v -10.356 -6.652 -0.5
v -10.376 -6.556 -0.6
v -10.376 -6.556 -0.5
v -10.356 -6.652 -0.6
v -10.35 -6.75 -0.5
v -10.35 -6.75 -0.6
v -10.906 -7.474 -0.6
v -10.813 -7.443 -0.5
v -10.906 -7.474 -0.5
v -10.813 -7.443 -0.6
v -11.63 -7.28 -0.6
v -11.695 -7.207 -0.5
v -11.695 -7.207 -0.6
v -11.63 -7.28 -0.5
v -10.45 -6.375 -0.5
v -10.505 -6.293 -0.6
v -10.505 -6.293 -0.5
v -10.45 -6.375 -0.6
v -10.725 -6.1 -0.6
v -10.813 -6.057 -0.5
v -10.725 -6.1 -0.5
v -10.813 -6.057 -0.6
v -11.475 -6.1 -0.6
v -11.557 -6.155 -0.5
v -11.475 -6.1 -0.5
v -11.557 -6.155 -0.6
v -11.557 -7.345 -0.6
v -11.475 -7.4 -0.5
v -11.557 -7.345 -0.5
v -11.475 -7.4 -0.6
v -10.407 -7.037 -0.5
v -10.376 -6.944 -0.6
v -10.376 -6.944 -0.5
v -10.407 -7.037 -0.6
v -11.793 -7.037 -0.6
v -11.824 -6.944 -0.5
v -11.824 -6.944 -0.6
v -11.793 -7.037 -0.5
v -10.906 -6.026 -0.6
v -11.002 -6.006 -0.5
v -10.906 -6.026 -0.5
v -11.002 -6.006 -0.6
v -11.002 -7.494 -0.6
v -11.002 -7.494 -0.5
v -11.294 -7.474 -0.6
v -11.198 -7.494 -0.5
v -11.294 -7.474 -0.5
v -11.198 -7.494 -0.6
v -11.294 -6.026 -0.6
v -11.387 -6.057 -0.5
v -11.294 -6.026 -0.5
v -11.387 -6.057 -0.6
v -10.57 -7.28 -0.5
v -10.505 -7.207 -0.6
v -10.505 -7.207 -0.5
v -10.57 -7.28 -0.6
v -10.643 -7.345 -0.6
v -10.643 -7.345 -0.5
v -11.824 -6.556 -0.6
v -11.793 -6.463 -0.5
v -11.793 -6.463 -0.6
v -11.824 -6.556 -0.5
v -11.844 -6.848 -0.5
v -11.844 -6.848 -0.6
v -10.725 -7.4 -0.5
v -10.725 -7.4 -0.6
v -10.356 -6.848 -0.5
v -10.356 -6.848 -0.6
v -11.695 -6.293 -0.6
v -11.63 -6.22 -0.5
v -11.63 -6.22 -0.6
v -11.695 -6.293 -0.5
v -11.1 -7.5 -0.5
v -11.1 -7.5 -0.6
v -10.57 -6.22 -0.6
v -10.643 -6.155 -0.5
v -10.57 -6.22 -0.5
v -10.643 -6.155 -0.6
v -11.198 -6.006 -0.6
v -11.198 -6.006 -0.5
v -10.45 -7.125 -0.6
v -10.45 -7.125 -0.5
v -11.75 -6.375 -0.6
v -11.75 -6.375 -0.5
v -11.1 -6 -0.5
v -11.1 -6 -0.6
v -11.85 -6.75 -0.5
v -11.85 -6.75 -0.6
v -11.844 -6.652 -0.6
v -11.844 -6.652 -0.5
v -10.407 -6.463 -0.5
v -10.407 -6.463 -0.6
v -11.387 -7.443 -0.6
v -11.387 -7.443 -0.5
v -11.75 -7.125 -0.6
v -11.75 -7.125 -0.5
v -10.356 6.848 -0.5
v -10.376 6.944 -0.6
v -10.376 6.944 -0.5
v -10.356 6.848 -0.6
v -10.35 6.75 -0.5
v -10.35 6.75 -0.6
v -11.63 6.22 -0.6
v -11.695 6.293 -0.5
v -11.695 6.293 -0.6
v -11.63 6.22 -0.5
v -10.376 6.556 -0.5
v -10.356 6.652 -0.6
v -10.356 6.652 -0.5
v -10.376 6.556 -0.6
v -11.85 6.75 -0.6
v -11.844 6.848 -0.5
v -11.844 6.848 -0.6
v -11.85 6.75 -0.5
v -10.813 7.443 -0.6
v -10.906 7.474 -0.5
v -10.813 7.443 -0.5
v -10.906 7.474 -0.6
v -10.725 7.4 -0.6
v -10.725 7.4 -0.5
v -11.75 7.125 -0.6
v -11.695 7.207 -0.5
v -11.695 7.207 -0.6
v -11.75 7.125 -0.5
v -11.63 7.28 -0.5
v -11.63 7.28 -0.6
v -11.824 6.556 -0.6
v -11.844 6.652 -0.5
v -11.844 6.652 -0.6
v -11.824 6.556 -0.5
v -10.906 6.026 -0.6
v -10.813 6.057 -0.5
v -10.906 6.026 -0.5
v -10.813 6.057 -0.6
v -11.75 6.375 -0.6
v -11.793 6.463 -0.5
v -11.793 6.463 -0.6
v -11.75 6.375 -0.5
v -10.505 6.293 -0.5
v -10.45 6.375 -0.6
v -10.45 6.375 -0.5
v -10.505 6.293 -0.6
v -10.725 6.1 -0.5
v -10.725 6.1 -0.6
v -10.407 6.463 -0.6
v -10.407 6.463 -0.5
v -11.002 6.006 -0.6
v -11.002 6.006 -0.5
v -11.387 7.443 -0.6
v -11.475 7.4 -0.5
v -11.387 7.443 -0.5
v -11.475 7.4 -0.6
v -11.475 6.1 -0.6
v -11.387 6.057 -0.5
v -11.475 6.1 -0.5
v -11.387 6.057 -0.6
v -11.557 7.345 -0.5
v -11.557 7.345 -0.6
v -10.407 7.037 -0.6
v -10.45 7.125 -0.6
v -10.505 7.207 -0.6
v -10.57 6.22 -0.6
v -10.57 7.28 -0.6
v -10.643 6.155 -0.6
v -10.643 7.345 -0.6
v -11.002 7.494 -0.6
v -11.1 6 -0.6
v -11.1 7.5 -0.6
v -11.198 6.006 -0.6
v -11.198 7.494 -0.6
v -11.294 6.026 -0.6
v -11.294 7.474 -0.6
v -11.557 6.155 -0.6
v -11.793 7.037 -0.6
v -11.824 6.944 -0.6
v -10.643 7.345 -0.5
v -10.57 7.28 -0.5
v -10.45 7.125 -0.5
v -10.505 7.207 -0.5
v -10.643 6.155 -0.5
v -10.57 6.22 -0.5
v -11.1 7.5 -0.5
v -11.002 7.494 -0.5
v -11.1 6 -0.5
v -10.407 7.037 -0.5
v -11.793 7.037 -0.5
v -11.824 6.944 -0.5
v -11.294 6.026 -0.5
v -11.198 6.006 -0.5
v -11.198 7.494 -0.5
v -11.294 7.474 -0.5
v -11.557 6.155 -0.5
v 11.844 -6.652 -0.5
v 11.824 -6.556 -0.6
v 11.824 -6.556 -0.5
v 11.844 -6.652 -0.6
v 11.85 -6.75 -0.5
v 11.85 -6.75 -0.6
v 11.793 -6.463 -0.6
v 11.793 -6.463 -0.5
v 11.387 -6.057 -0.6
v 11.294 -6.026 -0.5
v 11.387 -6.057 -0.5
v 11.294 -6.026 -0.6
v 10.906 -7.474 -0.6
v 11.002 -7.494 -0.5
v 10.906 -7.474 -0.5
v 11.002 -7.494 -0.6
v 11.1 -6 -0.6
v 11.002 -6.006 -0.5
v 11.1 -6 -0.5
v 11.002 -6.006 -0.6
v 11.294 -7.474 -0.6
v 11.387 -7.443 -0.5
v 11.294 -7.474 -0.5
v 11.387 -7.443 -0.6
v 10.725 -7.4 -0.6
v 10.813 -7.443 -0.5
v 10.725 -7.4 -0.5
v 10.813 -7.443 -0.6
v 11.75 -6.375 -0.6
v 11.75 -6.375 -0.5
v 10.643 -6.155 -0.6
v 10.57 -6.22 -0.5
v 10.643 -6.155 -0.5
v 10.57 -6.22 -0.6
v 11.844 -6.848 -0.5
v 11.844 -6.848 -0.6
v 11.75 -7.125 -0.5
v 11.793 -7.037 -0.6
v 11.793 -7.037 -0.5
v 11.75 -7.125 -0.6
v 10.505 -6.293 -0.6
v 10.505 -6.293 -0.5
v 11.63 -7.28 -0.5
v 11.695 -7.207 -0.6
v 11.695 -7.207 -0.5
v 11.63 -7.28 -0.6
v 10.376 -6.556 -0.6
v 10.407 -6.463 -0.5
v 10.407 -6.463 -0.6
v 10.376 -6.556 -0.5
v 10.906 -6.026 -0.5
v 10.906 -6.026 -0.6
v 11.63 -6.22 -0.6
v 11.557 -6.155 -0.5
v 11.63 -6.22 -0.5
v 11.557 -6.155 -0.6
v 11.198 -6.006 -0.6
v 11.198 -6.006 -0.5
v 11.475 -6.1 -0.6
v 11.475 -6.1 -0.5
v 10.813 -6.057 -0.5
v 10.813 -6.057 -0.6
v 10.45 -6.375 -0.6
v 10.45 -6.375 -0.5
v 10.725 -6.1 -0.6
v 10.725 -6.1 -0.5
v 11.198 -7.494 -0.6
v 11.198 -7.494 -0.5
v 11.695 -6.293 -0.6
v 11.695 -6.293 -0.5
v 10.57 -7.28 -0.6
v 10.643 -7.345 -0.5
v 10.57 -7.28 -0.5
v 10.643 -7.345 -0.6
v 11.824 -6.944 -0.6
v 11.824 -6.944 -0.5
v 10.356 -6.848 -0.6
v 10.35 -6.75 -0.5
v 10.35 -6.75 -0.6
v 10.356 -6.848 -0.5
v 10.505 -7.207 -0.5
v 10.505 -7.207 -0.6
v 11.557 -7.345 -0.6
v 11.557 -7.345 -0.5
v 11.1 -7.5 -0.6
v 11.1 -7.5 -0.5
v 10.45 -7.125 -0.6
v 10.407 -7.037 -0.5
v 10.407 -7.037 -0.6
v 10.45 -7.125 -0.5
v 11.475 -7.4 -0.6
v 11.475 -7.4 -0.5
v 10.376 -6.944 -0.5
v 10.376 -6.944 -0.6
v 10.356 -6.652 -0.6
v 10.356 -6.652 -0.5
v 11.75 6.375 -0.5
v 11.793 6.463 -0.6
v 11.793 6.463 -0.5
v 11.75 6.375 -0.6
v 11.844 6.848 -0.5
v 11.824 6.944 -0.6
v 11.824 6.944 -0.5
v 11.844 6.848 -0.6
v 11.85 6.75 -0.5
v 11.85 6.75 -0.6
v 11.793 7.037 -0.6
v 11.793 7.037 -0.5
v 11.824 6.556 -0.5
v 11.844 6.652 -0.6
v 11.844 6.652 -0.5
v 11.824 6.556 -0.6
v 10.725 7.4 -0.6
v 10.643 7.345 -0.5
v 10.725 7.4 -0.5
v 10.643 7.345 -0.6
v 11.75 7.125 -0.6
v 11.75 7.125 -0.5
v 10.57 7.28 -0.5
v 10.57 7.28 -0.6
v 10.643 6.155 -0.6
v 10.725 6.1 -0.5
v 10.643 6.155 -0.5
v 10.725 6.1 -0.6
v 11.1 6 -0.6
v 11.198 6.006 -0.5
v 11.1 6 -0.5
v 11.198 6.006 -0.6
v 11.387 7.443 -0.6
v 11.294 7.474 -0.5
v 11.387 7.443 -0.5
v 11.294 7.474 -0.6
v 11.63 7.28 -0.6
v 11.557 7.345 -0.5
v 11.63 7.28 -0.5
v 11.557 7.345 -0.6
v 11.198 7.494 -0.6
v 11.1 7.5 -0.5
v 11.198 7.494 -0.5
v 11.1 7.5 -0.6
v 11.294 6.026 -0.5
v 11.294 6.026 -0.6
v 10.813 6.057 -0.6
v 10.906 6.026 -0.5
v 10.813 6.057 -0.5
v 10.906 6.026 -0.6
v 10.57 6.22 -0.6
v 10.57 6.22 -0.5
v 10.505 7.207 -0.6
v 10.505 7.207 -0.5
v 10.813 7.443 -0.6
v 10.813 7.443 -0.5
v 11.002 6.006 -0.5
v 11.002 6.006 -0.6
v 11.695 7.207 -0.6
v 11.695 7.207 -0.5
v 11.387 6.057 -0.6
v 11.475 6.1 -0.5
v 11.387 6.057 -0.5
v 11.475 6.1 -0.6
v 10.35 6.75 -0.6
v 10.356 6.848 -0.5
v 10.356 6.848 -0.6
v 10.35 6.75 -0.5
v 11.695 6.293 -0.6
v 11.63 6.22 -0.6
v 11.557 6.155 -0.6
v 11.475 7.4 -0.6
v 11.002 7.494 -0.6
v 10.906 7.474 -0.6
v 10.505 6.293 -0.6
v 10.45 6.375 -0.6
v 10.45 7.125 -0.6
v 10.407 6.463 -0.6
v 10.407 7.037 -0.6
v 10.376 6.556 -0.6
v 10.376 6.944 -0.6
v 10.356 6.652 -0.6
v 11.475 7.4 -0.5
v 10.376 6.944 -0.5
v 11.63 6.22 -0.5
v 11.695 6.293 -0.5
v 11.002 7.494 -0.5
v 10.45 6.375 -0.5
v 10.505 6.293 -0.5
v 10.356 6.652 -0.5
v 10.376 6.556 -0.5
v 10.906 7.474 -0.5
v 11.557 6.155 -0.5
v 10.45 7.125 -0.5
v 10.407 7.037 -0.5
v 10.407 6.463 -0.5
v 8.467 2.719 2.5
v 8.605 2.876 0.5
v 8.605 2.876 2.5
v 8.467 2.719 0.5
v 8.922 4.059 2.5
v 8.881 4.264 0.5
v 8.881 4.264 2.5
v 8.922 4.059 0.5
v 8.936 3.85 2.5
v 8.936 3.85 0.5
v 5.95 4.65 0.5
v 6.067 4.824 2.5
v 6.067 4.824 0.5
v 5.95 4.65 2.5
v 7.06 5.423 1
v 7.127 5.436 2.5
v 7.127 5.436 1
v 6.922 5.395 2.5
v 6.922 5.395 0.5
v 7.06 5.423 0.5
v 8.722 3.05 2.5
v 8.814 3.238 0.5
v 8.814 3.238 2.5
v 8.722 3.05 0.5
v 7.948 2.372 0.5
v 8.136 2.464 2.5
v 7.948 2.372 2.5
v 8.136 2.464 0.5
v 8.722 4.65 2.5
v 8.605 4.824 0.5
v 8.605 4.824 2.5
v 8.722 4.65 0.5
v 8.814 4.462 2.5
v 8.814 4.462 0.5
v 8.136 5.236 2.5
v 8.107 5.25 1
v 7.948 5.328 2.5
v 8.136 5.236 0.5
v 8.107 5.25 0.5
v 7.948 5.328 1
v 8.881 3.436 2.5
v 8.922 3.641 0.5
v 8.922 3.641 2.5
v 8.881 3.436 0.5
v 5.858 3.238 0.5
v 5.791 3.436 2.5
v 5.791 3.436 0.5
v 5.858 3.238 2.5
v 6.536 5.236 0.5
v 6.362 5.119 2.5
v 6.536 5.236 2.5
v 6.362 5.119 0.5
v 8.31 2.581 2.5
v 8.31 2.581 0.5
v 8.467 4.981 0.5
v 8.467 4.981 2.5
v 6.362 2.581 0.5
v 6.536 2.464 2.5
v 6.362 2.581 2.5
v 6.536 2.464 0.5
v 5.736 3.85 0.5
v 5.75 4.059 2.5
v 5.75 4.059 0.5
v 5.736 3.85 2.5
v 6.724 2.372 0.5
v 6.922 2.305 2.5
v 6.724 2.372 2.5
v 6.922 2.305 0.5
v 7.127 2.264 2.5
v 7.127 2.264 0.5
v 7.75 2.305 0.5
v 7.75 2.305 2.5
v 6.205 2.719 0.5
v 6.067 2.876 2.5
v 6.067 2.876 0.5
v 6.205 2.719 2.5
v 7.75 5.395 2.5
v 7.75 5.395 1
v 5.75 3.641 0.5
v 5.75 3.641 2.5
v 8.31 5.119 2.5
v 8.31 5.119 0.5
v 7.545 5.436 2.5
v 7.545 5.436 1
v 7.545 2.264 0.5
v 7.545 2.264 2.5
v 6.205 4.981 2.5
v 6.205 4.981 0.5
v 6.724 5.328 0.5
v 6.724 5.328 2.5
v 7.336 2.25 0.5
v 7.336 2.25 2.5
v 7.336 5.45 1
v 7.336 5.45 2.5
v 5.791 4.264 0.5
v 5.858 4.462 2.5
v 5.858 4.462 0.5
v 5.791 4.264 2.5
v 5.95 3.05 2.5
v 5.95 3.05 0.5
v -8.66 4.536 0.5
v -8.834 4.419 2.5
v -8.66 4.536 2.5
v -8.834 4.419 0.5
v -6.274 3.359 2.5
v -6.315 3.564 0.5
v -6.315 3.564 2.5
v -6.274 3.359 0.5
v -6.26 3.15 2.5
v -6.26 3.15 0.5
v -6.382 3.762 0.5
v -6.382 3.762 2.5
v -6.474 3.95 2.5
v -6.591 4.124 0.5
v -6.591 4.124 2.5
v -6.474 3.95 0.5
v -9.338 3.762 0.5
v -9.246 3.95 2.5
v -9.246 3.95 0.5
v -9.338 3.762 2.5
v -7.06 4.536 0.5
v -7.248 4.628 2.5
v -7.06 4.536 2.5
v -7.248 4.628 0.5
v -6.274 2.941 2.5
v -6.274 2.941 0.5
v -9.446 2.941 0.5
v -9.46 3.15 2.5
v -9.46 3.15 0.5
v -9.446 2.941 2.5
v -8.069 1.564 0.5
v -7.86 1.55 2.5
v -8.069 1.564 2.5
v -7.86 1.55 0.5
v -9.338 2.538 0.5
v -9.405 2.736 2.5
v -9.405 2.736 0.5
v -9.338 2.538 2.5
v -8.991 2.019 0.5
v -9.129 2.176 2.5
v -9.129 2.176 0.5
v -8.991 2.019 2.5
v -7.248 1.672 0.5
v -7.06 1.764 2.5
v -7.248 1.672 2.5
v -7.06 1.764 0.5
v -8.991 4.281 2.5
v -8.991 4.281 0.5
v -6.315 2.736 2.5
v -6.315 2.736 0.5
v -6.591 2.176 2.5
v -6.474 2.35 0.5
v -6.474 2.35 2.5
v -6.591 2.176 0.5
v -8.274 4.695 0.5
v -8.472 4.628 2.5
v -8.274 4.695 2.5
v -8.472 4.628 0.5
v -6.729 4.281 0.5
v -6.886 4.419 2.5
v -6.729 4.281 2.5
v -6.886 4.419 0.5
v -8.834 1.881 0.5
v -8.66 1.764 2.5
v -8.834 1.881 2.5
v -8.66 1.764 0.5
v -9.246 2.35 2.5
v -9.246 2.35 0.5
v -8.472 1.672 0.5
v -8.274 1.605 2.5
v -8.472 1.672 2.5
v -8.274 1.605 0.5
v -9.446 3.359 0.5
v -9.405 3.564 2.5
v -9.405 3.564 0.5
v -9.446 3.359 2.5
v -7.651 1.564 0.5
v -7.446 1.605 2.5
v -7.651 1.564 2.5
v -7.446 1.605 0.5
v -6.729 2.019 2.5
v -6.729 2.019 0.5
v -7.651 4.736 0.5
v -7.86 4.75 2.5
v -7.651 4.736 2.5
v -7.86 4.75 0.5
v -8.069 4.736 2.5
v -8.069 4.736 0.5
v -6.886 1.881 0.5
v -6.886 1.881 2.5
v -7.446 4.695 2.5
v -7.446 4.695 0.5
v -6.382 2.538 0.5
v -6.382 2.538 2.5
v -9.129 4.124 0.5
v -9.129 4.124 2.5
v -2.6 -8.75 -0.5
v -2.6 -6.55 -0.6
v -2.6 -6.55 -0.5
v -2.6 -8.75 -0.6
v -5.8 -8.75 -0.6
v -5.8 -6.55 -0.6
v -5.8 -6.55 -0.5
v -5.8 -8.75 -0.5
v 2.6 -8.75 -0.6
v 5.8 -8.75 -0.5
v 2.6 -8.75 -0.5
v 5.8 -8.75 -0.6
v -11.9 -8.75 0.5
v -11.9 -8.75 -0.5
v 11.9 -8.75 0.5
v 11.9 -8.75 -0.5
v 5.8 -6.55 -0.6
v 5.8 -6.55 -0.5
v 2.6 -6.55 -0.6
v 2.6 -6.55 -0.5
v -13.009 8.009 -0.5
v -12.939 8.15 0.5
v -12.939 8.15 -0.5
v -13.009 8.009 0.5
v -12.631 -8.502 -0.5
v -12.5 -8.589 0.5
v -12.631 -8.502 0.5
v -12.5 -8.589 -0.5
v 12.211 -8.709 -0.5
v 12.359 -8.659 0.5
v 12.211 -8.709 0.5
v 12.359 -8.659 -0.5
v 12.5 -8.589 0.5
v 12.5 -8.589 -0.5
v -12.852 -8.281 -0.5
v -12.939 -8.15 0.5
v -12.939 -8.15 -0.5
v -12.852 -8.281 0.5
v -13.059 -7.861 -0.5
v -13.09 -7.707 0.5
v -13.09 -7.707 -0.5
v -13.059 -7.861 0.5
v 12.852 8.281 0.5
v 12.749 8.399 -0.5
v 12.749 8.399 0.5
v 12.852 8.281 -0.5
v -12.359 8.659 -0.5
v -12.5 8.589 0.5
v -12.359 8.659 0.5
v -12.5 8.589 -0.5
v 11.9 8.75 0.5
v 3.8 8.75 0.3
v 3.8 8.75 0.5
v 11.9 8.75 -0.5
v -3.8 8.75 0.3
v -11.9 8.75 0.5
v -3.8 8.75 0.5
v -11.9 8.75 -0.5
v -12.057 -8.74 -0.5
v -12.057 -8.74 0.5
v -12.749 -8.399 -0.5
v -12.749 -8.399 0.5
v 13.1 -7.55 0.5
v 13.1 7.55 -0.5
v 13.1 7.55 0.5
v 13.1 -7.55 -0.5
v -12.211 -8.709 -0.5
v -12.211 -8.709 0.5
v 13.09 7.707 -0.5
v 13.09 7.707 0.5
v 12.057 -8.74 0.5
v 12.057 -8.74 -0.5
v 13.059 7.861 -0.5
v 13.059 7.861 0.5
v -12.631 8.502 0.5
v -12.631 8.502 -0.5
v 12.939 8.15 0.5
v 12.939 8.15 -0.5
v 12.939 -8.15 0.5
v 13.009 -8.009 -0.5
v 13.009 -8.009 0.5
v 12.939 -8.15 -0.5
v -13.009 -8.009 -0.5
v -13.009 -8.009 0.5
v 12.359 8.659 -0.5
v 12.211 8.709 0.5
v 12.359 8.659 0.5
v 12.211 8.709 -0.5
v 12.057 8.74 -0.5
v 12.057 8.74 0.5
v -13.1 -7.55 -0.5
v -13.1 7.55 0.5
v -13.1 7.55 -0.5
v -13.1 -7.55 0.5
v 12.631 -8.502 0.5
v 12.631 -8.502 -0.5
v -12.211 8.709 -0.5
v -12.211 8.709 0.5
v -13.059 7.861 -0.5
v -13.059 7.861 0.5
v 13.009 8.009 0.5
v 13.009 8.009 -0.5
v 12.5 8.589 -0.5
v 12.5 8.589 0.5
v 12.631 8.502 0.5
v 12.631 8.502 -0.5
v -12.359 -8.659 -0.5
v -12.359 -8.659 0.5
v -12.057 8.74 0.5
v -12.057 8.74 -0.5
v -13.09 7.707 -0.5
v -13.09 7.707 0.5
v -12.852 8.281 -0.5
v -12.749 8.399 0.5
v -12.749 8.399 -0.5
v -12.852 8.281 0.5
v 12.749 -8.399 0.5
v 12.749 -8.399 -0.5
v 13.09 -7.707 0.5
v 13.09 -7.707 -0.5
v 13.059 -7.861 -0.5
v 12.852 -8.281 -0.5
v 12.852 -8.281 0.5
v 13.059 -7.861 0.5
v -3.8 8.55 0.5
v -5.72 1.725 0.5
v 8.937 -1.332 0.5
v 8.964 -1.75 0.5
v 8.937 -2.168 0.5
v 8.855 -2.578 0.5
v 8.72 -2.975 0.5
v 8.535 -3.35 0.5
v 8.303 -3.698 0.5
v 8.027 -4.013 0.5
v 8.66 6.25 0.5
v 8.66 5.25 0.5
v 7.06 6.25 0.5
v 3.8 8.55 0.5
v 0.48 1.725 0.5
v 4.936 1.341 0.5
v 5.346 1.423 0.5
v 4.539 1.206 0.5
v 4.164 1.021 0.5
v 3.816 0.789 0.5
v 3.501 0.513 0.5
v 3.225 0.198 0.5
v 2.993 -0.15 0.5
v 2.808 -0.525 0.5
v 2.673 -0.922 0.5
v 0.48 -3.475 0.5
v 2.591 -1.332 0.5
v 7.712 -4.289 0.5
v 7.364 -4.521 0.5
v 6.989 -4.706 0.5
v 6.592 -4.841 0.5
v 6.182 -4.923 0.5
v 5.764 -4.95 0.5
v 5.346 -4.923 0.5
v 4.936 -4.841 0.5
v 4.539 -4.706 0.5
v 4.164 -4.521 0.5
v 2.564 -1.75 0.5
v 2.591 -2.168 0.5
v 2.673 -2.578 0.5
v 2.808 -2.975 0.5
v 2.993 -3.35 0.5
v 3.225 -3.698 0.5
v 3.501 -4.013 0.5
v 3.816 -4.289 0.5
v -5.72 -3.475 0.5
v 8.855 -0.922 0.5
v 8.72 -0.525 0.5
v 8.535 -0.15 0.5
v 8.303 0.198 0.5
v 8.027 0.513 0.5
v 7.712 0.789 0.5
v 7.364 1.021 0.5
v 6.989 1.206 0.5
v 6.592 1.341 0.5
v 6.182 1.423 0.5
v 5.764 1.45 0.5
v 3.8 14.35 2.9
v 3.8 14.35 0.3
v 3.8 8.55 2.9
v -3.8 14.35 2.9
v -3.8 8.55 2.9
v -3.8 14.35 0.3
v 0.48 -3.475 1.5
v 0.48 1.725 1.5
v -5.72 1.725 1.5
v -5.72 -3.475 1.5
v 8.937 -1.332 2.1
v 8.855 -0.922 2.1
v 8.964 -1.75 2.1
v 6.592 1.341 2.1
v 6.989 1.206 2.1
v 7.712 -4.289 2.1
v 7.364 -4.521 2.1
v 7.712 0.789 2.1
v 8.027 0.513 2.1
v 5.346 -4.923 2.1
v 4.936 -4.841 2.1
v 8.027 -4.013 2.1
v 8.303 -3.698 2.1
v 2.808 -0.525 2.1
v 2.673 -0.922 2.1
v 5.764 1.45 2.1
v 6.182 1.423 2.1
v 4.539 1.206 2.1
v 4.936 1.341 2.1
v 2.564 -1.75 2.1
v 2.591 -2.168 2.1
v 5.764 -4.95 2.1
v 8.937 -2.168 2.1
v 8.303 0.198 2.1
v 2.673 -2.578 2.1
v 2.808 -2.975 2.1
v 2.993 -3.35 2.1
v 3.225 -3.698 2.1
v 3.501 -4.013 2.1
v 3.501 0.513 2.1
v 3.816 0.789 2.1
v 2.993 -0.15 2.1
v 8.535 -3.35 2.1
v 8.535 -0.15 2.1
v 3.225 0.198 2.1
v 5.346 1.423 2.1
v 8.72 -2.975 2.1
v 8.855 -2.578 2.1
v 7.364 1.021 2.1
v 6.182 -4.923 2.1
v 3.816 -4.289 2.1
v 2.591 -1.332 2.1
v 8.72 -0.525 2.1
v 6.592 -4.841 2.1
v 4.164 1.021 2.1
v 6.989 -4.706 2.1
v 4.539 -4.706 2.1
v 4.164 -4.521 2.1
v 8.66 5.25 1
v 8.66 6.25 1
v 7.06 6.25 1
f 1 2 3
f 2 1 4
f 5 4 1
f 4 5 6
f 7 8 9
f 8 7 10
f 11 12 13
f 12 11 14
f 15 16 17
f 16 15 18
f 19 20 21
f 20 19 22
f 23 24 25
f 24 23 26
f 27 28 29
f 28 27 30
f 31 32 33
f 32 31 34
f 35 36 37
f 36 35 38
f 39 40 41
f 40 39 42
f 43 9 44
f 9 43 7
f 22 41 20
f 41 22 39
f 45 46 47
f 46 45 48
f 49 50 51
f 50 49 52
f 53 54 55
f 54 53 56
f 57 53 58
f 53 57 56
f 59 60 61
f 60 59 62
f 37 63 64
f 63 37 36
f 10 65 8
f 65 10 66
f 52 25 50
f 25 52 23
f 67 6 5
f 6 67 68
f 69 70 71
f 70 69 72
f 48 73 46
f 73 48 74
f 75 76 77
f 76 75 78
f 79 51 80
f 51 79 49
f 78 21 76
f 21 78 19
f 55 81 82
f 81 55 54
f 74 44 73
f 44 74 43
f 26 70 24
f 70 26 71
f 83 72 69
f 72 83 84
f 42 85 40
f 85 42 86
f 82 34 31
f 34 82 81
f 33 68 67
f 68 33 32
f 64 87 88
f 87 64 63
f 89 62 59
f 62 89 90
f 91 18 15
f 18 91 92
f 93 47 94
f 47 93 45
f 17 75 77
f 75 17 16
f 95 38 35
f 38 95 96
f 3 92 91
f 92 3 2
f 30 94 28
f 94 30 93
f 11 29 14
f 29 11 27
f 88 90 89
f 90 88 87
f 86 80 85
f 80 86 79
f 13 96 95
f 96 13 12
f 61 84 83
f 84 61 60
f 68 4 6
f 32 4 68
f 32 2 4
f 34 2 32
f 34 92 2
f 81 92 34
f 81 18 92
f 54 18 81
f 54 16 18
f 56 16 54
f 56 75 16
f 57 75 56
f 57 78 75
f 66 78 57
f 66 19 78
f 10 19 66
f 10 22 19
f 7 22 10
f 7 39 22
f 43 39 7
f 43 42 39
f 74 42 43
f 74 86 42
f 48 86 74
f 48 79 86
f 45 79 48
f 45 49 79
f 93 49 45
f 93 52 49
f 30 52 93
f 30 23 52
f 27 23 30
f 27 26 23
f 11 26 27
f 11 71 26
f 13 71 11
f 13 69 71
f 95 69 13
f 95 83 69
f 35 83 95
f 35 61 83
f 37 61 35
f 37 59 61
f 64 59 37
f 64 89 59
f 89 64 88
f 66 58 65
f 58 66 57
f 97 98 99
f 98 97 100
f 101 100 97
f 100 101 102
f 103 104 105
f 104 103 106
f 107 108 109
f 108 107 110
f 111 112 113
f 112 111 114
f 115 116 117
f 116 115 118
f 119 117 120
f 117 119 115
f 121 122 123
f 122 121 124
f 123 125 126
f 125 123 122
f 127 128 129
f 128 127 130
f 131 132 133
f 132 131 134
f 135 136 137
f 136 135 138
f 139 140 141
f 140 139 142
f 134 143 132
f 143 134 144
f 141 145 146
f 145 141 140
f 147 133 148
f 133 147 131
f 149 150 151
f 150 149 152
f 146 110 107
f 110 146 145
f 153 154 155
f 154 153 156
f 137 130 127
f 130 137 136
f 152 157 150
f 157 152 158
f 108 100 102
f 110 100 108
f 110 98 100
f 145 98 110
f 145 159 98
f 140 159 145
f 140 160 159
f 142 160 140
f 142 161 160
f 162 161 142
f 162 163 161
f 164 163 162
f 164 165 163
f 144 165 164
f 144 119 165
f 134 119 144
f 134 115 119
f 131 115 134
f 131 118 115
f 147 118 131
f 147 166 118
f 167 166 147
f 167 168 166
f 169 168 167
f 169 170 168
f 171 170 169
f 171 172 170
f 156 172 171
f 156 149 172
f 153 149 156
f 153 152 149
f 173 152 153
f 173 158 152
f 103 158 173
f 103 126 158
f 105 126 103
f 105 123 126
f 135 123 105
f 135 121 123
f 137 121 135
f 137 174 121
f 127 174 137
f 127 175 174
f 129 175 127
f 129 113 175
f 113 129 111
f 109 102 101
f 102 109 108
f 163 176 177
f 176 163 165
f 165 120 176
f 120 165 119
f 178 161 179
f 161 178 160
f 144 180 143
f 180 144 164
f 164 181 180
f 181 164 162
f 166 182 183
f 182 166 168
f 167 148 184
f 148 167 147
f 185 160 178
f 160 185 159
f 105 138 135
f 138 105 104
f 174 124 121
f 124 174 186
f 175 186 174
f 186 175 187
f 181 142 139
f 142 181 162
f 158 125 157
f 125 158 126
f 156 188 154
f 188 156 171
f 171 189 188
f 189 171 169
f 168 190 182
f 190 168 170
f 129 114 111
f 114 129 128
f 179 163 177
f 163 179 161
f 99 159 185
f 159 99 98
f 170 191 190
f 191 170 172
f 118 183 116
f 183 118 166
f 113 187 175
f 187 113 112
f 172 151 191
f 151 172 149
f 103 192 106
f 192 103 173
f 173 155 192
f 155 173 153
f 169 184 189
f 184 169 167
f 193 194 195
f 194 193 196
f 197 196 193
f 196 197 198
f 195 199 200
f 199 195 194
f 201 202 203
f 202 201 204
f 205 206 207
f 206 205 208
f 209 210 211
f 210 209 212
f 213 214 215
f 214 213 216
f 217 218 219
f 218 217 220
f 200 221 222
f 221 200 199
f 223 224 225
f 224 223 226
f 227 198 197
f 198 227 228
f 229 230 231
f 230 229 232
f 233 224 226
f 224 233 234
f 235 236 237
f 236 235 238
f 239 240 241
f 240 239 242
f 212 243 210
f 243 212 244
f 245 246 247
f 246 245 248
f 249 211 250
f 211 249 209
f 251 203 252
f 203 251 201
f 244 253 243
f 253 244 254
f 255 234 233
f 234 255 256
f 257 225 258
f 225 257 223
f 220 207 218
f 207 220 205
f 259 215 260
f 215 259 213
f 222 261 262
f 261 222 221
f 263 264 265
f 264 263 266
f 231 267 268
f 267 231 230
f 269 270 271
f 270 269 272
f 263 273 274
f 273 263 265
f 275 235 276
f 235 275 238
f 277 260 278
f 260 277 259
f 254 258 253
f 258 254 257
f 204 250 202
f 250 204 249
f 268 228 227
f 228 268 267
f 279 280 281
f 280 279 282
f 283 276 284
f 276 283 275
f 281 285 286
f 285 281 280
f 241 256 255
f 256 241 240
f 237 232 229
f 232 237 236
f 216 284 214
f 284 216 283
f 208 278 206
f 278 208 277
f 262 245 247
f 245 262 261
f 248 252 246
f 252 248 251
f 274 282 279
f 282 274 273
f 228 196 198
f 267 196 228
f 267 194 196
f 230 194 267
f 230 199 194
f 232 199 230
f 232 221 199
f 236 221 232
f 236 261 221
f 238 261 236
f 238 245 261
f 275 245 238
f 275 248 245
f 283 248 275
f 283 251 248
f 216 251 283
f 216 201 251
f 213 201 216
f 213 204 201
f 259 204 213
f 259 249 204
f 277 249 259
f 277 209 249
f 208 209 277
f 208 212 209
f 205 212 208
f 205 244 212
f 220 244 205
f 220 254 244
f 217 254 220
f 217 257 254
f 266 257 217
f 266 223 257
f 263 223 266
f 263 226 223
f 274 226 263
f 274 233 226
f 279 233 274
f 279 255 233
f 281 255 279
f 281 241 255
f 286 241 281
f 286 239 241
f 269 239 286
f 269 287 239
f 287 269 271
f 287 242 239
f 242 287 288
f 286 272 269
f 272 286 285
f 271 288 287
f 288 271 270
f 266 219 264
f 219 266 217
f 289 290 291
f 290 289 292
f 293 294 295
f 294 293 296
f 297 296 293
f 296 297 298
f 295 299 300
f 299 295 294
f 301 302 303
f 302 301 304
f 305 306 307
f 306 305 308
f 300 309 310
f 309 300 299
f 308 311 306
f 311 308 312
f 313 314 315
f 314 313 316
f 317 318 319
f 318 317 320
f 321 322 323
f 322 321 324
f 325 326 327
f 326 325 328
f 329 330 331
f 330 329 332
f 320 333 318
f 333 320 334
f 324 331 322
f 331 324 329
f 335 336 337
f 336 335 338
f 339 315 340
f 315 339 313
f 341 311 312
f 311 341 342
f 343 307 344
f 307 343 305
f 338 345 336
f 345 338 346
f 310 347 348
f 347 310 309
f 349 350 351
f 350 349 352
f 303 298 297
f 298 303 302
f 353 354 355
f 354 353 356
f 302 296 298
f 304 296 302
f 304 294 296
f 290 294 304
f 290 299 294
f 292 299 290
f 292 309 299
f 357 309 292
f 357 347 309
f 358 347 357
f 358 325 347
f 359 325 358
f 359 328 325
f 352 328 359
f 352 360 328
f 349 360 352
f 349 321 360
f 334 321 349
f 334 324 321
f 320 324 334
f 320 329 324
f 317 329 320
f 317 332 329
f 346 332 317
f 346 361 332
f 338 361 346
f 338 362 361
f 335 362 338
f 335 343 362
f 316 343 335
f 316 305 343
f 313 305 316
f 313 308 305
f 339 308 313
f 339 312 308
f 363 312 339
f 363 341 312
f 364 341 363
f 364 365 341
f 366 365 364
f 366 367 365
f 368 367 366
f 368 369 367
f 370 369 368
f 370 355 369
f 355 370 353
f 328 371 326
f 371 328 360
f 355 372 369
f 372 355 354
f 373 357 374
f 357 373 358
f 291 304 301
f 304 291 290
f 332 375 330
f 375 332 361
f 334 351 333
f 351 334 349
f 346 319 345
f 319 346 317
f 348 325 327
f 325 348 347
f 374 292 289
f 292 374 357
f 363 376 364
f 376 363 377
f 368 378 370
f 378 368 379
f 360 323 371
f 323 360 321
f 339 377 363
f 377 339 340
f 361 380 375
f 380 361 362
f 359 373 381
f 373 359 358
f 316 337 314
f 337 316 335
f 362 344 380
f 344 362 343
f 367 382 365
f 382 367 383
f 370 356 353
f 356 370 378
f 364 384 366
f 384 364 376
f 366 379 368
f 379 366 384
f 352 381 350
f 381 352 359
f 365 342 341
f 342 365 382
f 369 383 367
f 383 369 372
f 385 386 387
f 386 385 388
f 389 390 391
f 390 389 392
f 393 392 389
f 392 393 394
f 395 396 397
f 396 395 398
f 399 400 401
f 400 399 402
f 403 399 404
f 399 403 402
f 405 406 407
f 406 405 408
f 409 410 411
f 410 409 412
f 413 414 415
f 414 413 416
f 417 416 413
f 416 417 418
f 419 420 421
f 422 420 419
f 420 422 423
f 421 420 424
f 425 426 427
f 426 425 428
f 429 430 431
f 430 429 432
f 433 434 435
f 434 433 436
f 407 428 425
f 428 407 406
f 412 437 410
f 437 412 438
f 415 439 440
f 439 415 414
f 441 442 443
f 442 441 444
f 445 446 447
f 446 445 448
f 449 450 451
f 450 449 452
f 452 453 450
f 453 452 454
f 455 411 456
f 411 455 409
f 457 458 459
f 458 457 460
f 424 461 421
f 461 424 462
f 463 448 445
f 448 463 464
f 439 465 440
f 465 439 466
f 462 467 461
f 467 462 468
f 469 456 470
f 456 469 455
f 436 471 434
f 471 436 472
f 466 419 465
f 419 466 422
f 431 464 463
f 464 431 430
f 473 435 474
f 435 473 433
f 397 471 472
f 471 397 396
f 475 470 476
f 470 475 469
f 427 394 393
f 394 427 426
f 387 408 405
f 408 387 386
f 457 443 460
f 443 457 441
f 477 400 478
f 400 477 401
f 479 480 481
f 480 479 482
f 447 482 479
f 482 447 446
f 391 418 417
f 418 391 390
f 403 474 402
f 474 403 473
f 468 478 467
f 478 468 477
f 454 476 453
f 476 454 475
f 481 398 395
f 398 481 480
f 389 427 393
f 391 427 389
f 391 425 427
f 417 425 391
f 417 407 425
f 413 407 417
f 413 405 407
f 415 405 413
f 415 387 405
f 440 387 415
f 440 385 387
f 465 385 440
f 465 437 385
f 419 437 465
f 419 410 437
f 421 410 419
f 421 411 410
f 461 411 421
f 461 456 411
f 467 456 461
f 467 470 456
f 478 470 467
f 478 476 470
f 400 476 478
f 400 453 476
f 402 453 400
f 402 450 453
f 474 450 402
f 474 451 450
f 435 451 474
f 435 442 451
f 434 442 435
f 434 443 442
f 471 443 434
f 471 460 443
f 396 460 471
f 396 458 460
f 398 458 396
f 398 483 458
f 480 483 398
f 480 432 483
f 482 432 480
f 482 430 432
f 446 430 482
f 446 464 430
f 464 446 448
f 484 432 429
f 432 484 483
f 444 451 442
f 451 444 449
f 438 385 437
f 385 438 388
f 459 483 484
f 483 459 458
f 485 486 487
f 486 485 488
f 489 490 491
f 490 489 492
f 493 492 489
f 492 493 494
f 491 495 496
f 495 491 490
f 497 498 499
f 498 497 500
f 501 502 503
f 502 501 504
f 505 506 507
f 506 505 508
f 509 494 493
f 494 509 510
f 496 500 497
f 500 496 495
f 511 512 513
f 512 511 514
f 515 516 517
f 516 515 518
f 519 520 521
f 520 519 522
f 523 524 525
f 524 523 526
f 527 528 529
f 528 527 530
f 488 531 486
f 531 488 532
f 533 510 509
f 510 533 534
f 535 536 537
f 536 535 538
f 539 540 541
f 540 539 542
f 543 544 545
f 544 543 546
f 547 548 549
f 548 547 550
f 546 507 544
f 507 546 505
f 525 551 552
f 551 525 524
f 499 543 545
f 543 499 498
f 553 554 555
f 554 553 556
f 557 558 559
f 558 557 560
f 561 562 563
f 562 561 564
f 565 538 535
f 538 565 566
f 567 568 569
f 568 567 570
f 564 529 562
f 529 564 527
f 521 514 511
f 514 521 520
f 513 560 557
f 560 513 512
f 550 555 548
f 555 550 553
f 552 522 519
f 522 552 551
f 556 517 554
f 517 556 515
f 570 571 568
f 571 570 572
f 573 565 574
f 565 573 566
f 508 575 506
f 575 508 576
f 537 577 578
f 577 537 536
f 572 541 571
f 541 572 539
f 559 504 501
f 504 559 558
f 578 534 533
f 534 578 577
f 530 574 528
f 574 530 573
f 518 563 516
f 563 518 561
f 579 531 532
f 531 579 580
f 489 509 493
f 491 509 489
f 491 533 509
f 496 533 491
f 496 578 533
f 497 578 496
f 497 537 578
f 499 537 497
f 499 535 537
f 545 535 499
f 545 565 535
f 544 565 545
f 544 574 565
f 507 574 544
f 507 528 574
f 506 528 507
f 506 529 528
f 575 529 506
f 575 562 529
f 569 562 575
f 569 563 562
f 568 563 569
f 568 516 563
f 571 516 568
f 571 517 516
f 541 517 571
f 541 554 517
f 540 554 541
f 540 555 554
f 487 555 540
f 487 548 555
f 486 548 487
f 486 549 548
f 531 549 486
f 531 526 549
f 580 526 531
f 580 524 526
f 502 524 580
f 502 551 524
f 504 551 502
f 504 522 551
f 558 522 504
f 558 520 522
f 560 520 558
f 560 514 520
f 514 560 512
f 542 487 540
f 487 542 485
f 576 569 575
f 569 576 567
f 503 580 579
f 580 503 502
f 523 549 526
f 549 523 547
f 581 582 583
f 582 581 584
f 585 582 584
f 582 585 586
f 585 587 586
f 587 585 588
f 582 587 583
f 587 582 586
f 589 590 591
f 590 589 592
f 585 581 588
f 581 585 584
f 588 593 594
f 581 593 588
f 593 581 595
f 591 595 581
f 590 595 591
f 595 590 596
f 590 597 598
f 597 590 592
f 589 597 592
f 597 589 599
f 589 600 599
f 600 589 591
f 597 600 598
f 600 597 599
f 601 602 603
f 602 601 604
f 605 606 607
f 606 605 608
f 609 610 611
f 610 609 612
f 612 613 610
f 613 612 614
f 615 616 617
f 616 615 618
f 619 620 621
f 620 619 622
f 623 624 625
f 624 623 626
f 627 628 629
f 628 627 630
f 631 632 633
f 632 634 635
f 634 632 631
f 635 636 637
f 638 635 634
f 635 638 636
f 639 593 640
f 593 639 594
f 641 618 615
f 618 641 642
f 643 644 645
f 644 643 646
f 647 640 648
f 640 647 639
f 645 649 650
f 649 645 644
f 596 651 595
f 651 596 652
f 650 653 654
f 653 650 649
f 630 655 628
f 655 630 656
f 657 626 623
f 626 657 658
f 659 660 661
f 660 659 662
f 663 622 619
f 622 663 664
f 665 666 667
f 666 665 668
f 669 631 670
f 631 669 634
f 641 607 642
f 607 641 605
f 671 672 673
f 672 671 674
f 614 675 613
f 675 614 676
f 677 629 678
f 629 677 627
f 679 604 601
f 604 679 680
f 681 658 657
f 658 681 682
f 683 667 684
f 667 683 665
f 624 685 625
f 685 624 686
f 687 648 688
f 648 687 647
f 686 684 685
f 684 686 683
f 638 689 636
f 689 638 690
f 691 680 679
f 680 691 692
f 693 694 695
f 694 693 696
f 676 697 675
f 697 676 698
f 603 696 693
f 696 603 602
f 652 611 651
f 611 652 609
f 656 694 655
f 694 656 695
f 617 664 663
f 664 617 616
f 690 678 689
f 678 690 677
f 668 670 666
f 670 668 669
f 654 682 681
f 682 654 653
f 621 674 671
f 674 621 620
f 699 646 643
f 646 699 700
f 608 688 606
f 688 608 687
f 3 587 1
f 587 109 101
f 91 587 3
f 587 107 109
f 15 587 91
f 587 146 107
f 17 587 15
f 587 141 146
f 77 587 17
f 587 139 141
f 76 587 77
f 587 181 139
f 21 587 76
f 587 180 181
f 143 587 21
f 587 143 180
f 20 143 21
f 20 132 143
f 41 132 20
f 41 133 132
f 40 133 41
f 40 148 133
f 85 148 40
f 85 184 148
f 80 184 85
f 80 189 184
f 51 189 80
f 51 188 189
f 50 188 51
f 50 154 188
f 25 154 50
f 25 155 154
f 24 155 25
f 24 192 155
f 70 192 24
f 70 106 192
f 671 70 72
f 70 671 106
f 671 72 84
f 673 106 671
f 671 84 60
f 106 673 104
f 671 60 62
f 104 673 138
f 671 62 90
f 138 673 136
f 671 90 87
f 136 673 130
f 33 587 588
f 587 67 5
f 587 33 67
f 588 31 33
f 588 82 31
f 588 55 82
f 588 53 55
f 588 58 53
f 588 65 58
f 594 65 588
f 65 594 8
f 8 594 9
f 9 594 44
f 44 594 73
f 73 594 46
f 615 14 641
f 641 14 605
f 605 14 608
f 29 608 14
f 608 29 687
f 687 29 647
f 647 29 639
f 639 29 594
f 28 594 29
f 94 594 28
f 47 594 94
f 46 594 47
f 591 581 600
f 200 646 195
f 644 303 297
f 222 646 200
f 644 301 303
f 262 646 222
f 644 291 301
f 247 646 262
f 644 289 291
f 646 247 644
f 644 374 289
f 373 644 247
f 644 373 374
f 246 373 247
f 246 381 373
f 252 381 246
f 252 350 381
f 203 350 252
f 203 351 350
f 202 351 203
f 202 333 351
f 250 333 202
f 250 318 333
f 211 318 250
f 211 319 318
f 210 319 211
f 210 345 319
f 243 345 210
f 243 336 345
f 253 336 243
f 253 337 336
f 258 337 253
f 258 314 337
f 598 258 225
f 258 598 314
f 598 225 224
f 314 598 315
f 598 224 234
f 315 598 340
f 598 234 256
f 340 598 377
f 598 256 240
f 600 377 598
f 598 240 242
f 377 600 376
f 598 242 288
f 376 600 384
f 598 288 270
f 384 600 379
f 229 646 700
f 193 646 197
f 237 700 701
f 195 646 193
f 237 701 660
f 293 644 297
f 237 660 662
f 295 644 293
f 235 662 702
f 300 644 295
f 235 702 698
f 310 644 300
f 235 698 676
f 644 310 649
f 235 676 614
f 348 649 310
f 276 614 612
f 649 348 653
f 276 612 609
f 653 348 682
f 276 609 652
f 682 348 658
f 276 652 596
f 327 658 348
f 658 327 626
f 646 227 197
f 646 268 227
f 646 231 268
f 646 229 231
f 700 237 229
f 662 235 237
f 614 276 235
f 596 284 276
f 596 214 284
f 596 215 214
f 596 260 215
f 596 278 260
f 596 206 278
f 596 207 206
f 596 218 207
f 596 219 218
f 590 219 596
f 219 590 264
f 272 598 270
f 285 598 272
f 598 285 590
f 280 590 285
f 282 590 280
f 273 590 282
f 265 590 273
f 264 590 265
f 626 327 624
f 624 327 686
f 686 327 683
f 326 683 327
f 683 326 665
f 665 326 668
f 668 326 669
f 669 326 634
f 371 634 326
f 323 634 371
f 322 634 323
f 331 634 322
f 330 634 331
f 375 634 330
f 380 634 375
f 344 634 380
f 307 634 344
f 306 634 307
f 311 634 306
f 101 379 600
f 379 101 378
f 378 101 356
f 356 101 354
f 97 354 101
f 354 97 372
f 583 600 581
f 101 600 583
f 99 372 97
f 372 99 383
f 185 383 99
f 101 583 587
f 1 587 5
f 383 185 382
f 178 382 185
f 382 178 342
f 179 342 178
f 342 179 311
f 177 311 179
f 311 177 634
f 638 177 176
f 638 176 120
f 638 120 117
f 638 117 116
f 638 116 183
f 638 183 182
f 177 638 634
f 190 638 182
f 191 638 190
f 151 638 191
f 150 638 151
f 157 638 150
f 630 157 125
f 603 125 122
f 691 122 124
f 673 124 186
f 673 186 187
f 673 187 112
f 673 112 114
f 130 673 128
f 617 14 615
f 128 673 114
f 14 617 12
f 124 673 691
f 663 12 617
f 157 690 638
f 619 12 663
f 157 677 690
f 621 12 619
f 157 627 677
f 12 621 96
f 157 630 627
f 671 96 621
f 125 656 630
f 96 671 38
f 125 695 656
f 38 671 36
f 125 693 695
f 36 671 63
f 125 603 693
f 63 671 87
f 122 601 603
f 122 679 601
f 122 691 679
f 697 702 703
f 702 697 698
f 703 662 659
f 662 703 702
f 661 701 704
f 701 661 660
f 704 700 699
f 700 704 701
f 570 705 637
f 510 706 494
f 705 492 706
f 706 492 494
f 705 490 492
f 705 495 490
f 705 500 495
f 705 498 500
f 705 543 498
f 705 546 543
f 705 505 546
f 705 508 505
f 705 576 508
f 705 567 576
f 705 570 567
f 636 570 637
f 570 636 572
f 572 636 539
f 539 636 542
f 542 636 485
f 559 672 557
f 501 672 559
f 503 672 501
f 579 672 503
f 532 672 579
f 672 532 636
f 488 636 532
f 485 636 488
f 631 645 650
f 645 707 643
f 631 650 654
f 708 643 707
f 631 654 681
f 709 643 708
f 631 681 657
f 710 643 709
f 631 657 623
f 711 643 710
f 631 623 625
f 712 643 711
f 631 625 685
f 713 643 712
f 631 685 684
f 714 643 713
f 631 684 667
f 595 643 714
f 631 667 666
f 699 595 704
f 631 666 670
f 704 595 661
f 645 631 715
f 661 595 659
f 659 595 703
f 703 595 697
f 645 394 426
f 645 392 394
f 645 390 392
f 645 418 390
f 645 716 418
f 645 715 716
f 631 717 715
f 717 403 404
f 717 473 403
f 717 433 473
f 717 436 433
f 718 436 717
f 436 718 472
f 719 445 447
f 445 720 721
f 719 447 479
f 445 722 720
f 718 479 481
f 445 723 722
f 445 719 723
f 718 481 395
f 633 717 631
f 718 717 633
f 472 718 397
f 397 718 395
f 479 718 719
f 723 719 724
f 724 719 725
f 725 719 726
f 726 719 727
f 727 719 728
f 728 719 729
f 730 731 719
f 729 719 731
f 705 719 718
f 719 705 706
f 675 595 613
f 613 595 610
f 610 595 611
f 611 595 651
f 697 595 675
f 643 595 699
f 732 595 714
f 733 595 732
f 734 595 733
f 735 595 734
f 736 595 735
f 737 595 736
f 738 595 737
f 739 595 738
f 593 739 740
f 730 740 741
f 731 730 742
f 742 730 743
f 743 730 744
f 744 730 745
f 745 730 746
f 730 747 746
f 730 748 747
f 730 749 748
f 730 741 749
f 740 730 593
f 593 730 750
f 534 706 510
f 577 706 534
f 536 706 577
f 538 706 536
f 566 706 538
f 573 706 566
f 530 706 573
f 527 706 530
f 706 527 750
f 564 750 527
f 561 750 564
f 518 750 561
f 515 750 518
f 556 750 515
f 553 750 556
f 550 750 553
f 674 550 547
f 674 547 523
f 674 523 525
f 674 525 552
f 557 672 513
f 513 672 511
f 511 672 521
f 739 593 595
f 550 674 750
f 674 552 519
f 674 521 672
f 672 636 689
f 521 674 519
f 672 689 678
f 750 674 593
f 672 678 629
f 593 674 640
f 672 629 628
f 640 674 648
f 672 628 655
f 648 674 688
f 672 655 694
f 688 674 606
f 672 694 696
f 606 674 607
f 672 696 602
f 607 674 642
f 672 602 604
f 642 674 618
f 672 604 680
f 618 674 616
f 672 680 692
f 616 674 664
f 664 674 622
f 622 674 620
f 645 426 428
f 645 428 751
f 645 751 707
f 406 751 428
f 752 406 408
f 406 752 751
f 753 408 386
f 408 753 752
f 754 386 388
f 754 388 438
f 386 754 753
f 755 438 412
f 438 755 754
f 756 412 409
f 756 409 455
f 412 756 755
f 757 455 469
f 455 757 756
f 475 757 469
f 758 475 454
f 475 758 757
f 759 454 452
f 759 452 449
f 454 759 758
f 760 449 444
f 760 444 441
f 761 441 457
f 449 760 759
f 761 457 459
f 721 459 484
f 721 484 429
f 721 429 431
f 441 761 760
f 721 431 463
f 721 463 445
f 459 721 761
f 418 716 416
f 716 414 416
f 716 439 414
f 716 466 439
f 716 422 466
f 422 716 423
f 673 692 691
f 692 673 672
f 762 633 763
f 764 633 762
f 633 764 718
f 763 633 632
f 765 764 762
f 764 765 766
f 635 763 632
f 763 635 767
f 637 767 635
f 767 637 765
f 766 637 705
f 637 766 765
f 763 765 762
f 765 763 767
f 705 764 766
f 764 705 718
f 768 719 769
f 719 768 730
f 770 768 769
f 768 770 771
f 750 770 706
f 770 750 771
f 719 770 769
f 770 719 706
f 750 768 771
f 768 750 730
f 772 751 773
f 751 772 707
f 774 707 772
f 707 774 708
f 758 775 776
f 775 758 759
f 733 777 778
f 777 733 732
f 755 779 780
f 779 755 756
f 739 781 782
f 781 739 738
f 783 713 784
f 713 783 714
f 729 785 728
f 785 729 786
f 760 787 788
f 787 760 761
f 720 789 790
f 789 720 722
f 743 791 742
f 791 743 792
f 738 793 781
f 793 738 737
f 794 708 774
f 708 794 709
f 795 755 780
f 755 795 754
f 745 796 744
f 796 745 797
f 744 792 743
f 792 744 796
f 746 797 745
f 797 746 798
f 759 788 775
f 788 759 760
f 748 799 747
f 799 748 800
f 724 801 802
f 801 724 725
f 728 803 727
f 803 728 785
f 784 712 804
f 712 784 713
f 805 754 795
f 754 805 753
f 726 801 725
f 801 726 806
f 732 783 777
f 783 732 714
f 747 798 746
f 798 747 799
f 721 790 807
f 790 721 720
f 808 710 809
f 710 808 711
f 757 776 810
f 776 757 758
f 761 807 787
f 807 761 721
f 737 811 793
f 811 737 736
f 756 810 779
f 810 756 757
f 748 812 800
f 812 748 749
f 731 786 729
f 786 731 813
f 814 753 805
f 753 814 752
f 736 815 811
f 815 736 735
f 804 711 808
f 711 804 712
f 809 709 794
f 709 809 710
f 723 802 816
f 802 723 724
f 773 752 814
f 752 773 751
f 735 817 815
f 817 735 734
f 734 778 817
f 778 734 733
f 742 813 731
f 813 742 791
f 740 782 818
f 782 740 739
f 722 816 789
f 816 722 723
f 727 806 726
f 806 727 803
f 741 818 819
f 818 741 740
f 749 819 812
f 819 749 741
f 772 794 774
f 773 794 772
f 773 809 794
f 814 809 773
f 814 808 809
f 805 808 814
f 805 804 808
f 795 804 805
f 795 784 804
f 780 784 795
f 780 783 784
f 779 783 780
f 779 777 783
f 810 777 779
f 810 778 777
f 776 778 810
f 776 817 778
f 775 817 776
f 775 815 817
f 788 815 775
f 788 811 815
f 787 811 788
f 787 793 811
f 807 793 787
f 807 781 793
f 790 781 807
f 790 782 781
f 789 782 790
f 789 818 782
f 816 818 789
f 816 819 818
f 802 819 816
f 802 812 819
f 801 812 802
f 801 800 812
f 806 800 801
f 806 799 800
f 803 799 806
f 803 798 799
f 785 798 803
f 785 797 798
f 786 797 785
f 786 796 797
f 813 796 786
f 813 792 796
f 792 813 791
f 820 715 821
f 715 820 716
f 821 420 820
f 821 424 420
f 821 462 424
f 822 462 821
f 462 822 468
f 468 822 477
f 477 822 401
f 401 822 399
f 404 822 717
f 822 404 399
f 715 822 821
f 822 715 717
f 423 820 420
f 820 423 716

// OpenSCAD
$fn = 48;

// Target overall PCB size
length = 26.2;
width  = 17.5;
thickness = 1.0;

// Small overlap to guarantee watertight unions
overlap = 0.2;

// Feature sizes (approximate, for recognizable charger-module look)
usb_w = 7.6;
usb_d = 5.8;
usb_h = 2.6;

chip_l = 6.2;
chip_w = 5.2;
chip_h = 1.2;

ind_r = 3.2;
ind_h = 1.8;

cap_r = 1.6;
cap_h = 2.2;

pad_l = 3.2;
pad_w = 2.2;
pad_h = 0.35;

hole_r = 0.75;

// Helpers
module rounded_board(l, w, h, r) {
    // Rounded rectangle prism via hull of corner cylinders
    hull() {
        for (sx = [-1, 1], sy = [-1, 1])
            translate([sx*(l/2 - r), sy*(w/2 - r), 0])
                cylinder(r=r, h=h, center=true);
    }
}

module battery_charger_module() {
    // Build as ONE connected solid (union of board + components + pads + connector)
    union() {
        // PCB (slightly rounded corners)
        pcb_r = 1.2;
        color([0.05, 0.15, 0.55])
            rounded_board(length, width, thickness, pcb_r);

        // Mount holes (as shallow recesses, not through-holes, to keep single solid)
        hole_depth = 0.35;
        hole_z = -thickness/2 + hole_depth/2; // recess into bottom face
        hole_x = length/2 - 2.0;
        hole_y = width/2 - 2.0;
        color([0.03, 0.10, 0.40])
        for (sx = [-1, 1], sy = [-1, 1])
            translate([sx*hole_x, sy*hole_y, hole_z])
                cylinder(r=hole_r, h=hole_depth + overlap, center=true);

        // USB connector at one short edge (protrudes outward, overlaps into PCB)
        usb_z = thickness/2 + usb_h/2 - overlap;
        usb_x = 0;
        usb_y = width/2 + usb_d/2 - overlap; // attached to +Y edge
        color([0.75, 0.75, 0.78])
            translate([usb_x, usb_y, usb_z])
                cube([usb_w, usb_d, usb_h], center=true);

        // Main charger IC (top side)
        chip_z = thickness/2 + chip_h/2 - overlap;
        chip_x = -length*0.10;
        chip_y = -width*0.05;
        color([0.12, 0.12, 0.12])
            translate([chip_x, chip_y, chip_z])
                cube([chip_l, chip_w, chip_h], center=true);

        // Inductor / coil (top side)
        ind_z = thickness/2 + ind_h/2 - overlap;
        ind_x = length*0.22;
        ind_y = -width*0.10;
        color([0.20, 0.20, 0.20])
            translate([ind_x, ind_y, ind_z])
                cylinder(r=ind_r, h=ind_h, center=true);

        // Two capacitors (top side)
        cap_z = thickness/2 + cap_h/2 - overlap;
        cap_x1 = length*0.28;
        cap_y1 = width*0.22;
        cap_x2 = -length*0.30;
        cap_y2 = width*0.18;
        color([0.35, 0.35, 0.35]) {
            translate([cap_x1, cap_y1, cap_z]) cylinder(r=cap_r, h=cap_h, center=true);
            translate([cap_x2, cap_y2, cap_z]) cylinder(r=cap_r, h=cap_h, center=true);
        }

        // Battery pads at opposite short edge (bottom side pads, but kept solid)
        pad_z = -thickness/2 + pad_h/2; // sits on bottom face
        pad_y = -width/2 + pad_w/2;     // near -Y edge
        pad_x_off = 4.2;
        color([0.85, 0.70, 0.20]) {
            translate([-pad_x_off, pad_y, pad_z])
                cube([pad_l, pad_w, pad_h + overlap], center=true);
            translate([ pad_x_off, pad_y, pad_z])
                cube([pad_l, pad_w, pad_h + overlap], center=true);
        }

        // Small status LED bump near USB edge (top side)
        led_l = 1.6;
        led_w = 1.0;
        led_h = 0.7;
        led_z = thickness/2 + led_h/2 - overlap;
        led_x = length*0.30;
        led_y = width/2 - 3.0;
        color([0.80, 0.10, 0.10])
            translate([led_x, led_y, led_z])
                cube([led_l, led_w, led_h], center=true);
    }
}

battery_charger_module();
